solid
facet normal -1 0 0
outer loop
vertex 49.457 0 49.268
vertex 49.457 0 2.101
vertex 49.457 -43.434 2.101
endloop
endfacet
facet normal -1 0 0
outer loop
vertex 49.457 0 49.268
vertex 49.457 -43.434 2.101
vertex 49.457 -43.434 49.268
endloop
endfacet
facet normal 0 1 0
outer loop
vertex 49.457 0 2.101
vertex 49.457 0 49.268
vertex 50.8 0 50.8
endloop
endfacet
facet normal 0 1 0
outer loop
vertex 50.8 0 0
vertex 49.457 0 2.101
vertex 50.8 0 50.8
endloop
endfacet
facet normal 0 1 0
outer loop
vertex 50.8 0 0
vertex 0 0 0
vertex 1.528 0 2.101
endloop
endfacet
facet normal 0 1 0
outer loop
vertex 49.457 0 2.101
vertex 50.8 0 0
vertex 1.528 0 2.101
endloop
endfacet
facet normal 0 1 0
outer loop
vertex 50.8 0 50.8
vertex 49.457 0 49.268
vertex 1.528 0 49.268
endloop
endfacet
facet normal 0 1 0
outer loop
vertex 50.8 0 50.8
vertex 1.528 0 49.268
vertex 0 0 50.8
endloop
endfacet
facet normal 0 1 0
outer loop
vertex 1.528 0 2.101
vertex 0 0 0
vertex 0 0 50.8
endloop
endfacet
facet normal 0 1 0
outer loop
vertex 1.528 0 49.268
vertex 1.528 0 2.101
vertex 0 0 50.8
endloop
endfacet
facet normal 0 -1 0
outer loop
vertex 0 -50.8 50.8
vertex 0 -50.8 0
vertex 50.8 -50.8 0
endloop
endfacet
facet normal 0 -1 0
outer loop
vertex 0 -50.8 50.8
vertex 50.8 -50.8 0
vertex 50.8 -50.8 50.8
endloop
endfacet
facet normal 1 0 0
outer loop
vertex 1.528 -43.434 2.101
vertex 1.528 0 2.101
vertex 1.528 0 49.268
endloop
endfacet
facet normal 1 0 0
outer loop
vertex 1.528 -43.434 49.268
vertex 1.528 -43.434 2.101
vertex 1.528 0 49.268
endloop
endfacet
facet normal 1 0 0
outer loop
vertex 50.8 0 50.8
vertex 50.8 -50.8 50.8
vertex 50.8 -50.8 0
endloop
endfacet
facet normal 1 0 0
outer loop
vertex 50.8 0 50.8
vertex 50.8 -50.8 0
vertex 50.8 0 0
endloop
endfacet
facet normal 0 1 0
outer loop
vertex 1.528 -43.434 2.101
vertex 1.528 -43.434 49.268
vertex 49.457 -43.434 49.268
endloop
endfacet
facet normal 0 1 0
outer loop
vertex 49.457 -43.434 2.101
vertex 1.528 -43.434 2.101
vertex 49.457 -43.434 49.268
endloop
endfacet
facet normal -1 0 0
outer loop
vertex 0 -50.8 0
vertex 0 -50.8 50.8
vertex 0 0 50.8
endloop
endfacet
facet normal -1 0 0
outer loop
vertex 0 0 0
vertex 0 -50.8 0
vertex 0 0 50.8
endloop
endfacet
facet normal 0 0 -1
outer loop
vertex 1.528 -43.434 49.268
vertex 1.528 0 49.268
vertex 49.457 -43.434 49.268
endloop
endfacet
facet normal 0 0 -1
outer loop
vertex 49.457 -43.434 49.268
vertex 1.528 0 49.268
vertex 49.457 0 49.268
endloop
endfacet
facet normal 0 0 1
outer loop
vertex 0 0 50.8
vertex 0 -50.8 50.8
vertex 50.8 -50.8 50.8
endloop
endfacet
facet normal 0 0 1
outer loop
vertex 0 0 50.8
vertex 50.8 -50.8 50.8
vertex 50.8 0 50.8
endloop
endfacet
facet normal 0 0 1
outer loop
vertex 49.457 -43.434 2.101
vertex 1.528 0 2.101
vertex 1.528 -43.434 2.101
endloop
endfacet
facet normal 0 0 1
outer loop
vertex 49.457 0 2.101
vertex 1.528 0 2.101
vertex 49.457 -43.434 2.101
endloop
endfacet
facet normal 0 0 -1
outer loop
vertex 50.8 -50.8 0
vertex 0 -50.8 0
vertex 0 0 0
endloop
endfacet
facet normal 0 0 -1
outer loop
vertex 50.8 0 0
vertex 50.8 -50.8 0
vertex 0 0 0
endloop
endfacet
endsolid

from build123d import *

# Parameters (mm, degrees)
F0_W     = 50.8
F0_H     = 50.8
F1_DEPTH = 50.8
F2_W     = 47.9298
F2_H     = 47.1678
F3_DEPTH = 43.434


with BuildPart() as f1:
    # F0 (on Right) → F1 (new body)
    with BuildSketch(Plane.YZ):
        with Locations((-25.4, 25.4)):
            Rectangle(F0_W, F0_H)
    extrude(amount=F1_DEPTH)

    # F2 (on Front) → F3 (cut)
    with BuildSketch(Plane.XZ):
        with Locations((25.492538, 25.684401)):
            Rectangle(F2_W, F2_H)
    extrude(amount=F3_DEPTH, mode=Mode.SUBTRACT)


solid = f1.part
